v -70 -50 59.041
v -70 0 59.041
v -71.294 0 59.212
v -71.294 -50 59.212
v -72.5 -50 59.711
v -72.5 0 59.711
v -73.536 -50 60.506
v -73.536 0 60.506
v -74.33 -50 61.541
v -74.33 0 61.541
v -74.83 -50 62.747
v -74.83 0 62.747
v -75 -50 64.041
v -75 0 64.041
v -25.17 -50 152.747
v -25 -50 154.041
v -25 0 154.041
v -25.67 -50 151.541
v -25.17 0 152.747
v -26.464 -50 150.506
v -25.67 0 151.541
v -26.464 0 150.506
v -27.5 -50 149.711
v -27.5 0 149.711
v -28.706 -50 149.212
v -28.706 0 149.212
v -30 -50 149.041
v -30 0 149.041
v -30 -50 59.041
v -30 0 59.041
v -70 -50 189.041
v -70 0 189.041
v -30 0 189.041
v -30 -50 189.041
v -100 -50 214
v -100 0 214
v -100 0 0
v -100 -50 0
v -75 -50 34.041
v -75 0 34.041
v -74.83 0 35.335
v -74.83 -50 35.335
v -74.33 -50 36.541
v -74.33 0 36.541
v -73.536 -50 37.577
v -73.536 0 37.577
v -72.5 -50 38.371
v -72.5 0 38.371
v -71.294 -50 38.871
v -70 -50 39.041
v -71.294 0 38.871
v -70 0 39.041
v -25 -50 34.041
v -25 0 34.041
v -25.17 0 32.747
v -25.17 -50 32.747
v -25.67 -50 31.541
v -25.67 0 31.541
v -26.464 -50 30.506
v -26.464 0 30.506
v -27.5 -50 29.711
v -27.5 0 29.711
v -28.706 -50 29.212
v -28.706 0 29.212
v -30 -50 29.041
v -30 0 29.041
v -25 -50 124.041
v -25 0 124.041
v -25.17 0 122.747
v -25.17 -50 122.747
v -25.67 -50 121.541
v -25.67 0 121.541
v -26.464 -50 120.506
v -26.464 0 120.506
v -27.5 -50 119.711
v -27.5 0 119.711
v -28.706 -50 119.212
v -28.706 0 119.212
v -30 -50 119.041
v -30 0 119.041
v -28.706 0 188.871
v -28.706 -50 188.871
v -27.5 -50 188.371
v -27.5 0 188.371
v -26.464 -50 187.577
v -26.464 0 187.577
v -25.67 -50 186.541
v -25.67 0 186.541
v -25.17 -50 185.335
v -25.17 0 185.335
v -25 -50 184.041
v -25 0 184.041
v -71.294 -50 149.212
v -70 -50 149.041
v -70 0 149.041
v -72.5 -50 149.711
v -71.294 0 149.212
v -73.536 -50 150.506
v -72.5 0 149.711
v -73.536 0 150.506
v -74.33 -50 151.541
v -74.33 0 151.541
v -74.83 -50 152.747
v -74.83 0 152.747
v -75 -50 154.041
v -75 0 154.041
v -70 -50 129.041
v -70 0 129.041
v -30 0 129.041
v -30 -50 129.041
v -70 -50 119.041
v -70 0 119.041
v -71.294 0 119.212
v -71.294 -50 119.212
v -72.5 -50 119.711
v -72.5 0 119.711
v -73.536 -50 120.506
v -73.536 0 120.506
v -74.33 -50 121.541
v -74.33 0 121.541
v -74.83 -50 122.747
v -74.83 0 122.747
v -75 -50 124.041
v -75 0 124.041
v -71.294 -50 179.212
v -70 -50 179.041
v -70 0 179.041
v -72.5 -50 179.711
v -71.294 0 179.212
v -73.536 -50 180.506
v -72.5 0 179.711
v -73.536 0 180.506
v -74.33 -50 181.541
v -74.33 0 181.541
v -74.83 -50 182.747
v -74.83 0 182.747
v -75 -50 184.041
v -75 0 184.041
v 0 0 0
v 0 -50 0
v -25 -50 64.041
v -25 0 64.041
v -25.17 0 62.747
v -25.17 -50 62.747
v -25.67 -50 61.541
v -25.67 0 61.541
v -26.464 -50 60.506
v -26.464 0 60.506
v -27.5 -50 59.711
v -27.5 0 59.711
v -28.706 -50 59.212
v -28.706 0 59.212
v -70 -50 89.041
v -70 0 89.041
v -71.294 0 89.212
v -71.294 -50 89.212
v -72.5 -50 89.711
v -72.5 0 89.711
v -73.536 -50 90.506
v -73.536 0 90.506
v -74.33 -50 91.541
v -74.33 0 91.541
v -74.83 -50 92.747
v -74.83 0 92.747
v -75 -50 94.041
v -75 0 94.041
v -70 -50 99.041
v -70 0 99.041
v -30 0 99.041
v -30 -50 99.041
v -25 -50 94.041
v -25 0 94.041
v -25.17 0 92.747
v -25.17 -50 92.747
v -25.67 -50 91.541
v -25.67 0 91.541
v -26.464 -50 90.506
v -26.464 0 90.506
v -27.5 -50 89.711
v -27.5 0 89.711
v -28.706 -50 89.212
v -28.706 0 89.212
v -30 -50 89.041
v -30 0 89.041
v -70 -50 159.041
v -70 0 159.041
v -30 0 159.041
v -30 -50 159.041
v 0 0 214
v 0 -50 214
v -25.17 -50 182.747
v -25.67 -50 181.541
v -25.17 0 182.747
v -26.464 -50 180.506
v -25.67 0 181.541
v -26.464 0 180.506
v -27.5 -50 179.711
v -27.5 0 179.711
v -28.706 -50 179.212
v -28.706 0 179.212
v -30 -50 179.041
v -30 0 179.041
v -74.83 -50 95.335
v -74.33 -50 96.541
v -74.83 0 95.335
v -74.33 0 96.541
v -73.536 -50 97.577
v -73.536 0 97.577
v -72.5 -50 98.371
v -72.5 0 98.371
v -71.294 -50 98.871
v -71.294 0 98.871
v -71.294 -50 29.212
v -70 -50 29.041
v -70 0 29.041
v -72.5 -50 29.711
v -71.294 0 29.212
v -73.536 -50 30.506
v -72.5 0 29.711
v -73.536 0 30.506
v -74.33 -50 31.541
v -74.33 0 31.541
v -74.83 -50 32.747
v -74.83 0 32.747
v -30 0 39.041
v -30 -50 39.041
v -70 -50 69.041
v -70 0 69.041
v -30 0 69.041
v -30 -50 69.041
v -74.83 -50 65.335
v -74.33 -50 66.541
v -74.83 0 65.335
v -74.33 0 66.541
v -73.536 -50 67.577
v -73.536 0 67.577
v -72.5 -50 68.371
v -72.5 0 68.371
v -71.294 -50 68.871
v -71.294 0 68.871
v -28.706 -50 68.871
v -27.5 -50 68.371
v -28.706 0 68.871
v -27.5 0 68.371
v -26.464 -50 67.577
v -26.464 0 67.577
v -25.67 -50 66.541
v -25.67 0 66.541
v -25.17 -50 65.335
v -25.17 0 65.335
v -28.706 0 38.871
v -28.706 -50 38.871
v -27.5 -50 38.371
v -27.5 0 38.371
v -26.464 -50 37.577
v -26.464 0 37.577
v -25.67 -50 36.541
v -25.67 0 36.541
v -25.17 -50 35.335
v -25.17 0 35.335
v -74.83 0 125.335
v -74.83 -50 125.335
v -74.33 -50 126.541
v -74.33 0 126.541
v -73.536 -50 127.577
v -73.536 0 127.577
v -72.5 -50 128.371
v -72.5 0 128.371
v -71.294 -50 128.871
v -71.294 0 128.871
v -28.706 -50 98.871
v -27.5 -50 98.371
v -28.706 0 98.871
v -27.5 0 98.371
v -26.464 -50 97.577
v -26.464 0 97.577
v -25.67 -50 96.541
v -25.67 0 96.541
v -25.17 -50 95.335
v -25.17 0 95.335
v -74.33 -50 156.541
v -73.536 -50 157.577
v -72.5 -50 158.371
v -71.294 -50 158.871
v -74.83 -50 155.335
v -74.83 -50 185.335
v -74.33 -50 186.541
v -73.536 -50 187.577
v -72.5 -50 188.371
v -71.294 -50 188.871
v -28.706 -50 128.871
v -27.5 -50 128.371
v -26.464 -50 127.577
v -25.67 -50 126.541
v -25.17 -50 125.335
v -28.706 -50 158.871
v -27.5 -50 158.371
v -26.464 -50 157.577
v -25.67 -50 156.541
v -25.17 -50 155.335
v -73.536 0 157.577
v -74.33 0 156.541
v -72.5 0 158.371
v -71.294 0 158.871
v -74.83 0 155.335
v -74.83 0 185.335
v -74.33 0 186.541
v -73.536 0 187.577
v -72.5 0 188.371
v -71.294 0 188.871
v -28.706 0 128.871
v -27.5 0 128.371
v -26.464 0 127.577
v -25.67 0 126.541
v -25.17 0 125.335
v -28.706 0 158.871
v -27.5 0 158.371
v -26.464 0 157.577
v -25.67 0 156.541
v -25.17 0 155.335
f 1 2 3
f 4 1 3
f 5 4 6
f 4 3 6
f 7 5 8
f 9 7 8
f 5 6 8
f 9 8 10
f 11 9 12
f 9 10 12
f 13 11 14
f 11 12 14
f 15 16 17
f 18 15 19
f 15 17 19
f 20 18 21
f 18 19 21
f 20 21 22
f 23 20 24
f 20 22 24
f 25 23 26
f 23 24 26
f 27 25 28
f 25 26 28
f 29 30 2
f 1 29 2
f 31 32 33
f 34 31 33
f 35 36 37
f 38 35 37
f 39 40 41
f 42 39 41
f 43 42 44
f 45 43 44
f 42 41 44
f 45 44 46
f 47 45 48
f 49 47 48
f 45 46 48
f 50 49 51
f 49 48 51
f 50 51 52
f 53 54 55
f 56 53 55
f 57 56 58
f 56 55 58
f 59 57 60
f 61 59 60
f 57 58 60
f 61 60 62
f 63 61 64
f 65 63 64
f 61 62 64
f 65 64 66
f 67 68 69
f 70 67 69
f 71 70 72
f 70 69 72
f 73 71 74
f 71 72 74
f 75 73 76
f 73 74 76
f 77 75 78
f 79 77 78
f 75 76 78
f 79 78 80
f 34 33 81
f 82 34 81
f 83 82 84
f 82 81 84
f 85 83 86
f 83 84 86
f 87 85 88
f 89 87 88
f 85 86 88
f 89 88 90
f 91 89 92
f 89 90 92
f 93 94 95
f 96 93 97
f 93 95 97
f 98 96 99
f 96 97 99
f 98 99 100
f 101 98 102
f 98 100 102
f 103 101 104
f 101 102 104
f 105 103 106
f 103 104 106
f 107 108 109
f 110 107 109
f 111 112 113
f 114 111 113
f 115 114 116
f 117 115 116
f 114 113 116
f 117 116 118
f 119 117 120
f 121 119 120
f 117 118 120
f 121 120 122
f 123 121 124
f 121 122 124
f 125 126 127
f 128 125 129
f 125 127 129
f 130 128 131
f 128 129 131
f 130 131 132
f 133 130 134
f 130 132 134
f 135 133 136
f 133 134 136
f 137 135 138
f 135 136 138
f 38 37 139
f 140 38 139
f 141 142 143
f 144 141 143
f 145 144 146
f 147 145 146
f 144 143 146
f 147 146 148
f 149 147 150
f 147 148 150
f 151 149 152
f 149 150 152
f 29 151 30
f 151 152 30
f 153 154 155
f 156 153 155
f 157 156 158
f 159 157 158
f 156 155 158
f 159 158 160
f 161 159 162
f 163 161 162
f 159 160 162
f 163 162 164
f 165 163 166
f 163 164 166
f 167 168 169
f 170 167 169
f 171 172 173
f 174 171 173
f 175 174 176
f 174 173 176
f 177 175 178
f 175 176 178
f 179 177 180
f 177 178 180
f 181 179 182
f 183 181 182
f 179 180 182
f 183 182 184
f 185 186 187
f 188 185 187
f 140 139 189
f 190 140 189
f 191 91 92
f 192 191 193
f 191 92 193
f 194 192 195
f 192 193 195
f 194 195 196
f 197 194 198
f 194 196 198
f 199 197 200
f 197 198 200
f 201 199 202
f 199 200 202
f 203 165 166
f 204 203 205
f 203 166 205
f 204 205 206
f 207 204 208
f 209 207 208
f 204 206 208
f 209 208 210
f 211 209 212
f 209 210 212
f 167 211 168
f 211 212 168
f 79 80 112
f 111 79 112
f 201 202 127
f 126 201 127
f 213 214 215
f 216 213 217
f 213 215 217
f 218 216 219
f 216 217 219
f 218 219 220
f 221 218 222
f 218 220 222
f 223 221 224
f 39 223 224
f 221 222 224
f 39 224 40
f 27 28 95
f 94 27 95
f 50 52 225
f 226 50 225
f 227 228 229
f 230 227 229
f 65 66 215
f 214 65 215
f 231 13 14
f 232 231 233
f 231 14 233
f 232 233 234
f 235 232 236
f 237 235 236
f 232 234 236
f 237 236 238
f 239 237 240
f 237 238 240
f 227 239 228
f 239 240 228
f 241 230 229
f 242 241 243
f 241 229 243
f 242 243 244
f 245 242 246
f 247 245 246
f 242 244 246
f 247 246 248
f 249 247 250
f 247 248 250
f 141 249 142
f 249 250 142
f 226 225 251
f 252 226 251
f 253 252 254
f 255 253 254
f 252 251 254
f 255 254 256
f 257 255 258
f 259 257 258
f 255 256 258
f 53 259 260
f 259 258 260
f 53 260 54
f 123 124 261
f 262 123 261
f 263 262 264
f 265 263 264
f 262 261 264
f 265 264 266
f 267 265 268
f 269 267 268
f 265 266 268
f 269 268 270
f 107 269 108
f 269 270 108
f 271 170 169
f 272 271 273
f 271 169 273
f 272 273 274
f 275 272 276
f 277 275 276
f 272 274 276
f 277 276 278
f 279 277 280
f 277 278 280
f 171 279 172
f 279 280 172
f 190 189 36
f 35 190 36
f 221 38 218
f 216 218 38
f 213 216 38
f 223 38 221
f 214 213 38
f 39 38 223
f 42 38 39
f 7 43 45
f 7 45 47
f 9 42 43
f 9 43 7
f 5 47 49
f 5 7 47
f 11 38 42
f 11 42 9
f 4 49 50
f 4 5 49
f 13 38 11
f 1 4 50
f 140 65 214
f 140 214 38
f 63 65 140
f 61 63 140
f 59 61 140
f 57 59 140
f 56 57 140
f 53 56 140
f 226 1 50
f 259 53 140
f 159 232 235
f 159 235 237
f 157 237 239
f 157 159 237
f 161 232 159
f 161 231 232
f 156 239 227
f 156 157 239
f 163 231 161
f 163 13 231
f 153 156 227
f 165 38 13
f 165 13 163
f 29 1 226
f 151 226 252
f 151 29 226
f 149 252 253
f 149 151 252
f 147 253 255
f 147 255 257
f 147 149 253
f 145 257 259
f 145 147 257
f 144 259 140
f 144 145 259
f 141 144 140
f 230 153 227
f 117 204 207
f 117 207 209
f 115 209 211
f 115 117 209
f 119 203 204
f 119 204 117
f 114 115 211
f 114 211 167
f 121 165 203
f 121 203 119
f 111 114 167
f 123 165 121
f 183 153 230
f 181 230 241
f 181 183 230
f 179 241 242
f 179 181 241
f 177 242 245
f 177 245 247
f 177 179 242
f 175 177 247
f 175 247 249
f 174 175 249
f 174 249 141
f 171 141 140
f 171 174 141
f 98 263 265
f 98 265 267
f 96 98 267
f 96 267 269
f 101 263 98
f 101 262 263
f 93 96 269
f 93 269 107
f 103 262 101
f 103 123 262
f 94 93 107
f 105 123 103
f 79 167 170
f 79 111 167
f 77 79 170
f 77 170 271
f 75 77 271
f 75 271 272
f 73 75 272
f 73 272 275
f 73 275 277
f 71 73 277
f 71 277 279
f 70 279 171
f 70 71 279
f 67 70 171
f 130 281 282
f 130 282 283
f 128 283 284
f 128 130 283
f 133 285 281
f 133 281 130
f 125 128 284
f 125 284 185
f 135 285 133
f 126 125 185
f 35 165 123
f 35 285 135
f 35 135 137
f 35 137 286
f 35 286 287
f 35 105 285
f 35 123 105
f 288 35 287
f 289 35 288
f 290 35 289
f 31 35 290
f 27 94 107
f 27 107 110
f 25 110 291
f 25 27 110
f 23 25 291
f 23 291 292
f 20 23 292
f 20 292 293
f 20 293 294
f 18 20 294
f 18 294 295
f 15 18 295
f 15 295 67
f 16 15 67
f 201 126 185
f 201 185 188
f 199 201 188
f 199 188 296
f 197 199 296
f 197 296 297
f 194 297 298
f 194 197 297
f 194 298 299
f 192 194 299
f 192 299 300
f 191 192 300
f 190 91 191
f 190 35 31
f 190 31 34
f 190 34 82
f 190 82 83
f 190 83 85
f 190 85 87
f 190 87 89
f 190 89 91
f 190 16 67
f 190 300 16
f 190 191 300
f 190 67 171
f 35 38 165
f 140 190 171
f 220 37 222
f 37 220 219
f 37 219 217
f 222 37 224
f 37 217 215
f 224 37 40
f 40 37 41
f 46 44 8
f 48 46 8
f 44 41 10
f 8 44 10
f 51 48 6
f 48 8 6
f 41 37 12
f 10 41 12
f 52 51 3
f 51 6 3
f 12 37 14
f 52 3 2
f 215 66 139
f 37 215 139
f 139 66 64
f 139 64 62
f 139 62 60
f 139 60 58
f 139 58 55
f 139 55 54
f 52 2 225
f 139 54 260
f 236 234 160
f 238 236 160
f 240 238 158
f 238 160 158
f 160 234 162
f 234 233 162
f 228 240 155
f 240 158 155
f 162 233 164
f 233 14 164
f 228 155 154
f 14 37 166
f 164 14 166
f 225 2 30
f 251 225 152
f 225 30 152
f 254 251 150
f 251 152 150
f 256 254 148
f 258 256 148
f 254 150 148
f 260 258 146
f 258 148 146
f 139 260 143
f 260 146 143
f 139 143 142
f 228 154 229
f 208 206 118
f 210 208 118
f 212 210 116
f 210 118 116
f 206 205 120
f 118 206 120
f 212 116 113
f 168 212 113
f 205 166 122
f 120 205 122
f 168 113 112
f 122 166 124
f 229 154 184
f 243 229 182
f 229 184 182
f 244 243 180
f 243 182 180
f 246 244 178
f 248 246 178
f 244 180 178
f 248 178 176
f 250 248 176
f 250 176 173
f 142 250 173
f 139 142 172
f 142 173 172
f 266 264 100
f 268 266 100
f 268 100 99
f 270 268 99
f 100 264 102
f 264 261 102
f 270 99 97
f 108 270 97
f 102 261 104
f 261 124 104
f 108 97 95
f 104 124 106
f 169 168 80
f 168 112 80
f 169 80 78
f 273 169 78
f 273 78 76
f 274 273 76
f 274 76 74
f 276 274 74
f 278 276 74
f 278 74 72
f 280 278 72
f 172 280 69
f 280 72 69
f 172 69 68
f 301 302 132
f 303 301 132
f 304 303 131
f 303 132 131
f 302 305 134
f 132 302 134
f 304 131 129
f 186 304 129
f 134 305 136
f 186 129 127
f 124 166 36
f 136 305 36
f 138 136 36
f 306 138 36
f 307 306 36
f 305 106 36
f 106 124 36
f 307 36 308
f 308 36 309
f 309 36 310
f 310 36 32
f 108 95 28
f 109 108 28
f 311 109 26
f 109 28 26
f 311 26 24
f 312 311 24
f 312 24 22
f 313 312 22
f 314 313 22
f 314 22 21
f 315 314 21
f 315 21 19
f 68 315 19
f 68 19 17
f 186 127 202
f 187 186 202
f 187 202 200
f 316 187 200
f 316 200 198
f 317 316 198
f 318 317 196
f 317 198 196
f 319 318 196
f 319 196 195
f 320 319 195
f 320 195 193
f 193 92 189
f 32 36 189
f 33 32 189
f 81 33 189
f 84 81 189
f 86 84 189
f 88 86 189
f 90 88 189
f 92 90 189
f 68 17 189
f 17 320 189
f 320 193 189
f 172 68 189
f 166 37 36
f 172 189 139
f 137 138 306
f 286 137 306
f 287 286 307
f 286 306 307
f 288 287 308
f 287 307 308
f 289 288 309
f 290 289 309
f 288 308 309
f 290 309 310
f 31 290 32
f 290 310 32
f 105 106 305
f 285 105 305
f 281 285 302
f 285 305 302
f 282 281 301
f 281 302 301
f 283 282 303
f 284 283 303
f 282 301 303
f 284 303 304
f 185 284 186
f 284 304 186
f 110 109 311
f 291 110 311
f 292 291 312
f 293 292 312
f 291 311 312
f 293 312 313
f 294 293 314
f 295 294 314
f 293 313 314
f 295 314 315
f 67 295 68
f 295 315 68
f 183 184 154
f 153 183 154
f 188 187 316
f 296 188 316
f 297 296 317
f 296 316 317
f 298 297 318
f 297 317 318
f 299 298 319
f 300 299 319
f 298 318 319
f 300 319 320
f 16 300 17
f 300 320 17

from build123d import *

# Parameters (mm, degrees)
F1_DEPTH = 50


with BuildPart() as f1:
    # F0 (on Front) → F1 (new body)
    with BuildSketch(Plane.XZ):
        with BuildLine():
            Line((-25, 124.041277), (0, 124.041277))
            Line((0, 124.041277), (0, 154.041277))
            Line((0, 154.041277), (-25, 154.041277))
            ThreePointArc((-25, 154.041277), (-26.464466, 150.505743), (-30, 149.041277))
            Line((-30, 149.041277), (-70, 149.041277))
            ThreePointArc((-70, 149.041277), (-73.535534, 150.505743), (-75, 154.041277))
            Line((-75, 154.041277), (-100, 154.041277))
            Line((-100, 154.041277), (-100, 124.041277))
            Line((-100, 124.041277), (-75, 124.041277))
            ThreePointArc((-75, 124.041277), (-73.535534, 127.57681), (-70, 129.041277))
            Line((-70, 129.041277), (-30, 129.041277))
            ThreePointArc((-30, 129.041277), (-26.464466, 127.57681), (-25, 124.041277))
        make_face()
        with BuildLine():
            Line((-25, 154.041277), (0, 154.041277))
            Line((0, 154.041277), (0, 184.041277))
            Line((0, 184.041277), (-25, 184.041277))
            ThreePointArc((-25, 184.041277), (-26.464466, 180.505743), (-30, 179.041277))
            Line((-30, 179.041277), (-70, 179.041277))
            ThreePointArc((-70, 179.041277), (-73.535534, 180.505743), (-75, 184.041277))
            Line((-75, 184.041277), (-100, 184.041277))
            Line((-100, 184.041277), (-100, 154.041277))
            Line((-100, 154.041277), (-75, 154.041277))
            ThreePointArc((-75, 154.041277), (-73.535534, 157.57681), (-70, 159.041277))
            Line((-70, 159.041277), (-30, 159.041277))
            ThreePointArc((-30, 159.041277), (-26.464466, 157.57681), (-25, 154.041277))
        make_face()
        with BuildLine():
            Line((-25, 184.041277), (0, 184.041277))
            Line((0, 184.041277), (0, 214))
            Line((0, 214), (-100, 214))
            Line((-100, 214), (-100, 184.041277))
            Line((-100, 184.041277), (-75, 184.041277))
            ThreePointArc((-75, 184.041277), (-73.535534, 187.57681), (-70, 189.041277))
            Line((-70, 189.041277), (-30, 189.041277))
            ThreePointArc((-30, 189.041277), (-26.464466, 187.57681), (-25, 184.041277))
        make_face()
        with BuildLine():
            Line((-25, 94.041277), (0, 94.041277))
            Line((0, 94.041277), (0, 124.041277))
            Line((0, 124.041277), (-25, 124.041277))
            ThreePointArc((-25, 124.041277), (-26.464466, 120.505743), (-30, 119.041277))
            Line((-30, 119.041277), (-70, 119.041277))
            ThreePointArc((-70, 119.041277), (-73.535534, 120.505743), (-75, 124.041277))
            Line((-75, 124.041277), (-100, 124.041277))
            Line((-100, 124.041277), (-100, 94.041277))
            Line((-100, 94.041277), (-75, 94.041277))
            ThreePointArc((-75, 94.041277), (-73.535534, 97.57681), (-70, 99.041277))
            Line((-70, 99.041277), (-30, 99.041277))
            ThreePointArc((-30, 99.041277), (-26.464466, 97.57681), (-25, 94.041277))
        make_face()
        with BuildLine():
            Line((-25, 64.041277), (0, 64.041277))
            Line((0, 64.041277), (0, 94.041277))
            Line((0, 94.041277), (-25, 94.041277))
            ThreePointArc((-25, 94.041277), (-26.464466, 90.505743), (-30, 89.041277))
            Line((-30, 89.041277), (-70, 89.041277))
            ThreePointArc((-70, 89.041277), (-73.535534, 90.505743), (-75, 94.041277))
            Line((-75, 94.041277), (-100, 94.041277))
            Line((-100, 94.041277), (-100, 64.041277))
            Line((-100, 64.041277), (-75, 64.041277))
            ThreePointArc((-75, 64.041277), (-73.535534, 67.57681), (-70, 69.041277))
            Line((-70, 69.041277), (-30, 69.041277))
            ThreePointArc((-30, 69.041277), (-26.464466, 67.57681), (-25, 64.041277))
        make_face()
        with BuildLine():
            Line((-25, 34.041277), (0, 34.041277))
            Line((0, 34.041277), (0, 64.041277))
            Line((0, 64.041277), (-25, 64.041277))
            ThreePointArc((-25, 64.041277), (-26.464466, 60.505743), (-30, 59.041277))
            Line((-30, 59.041277), (-70, 59.041277))
            ThreePointArc((-70, 59.041277), (-73.535534, 60.505743), (-75, 64.041277))
            Line((-75, 64.041277), (-100, 64.041277))
            Line((-100, 64.041277), (-100, 34.041277))
            Line((-100, 34.041277), (-75, 34.041277))
            ThreePointArc((-75, 34.041277), (-73.535534, 37.57681), (-70, 39.041277))
            Line((-70, 39.041277), (-30, 39.041277))
            ThreePointArc((-30, 39.041277), (-26.464466, 37.57681), (-25, 34.041277))
        make_face()
        with BuildLine():
            Line((-100, 0), (0, 0))
            Line((0, 0), (0, 34.041277))
            Line((0, 34.041277), (-25, 34.041277))
            ThreePointArc((-25, 34.041277), (-26.464466, 30.505743), (-30, 29.041277))
            Line((-30, 29.041277), (-70, 29.041277))
            ThreePointArc((-70, 29.041277), (-73.535534, 30.505743), (-75, 34.041277))
            Line((-75, 34.041277), (-100, 34.041277))
            Line((-100, 34.041277), (-100, 0))
        make_face()
    extrude(amount=F1_DEPTH)


solid = f1.part
